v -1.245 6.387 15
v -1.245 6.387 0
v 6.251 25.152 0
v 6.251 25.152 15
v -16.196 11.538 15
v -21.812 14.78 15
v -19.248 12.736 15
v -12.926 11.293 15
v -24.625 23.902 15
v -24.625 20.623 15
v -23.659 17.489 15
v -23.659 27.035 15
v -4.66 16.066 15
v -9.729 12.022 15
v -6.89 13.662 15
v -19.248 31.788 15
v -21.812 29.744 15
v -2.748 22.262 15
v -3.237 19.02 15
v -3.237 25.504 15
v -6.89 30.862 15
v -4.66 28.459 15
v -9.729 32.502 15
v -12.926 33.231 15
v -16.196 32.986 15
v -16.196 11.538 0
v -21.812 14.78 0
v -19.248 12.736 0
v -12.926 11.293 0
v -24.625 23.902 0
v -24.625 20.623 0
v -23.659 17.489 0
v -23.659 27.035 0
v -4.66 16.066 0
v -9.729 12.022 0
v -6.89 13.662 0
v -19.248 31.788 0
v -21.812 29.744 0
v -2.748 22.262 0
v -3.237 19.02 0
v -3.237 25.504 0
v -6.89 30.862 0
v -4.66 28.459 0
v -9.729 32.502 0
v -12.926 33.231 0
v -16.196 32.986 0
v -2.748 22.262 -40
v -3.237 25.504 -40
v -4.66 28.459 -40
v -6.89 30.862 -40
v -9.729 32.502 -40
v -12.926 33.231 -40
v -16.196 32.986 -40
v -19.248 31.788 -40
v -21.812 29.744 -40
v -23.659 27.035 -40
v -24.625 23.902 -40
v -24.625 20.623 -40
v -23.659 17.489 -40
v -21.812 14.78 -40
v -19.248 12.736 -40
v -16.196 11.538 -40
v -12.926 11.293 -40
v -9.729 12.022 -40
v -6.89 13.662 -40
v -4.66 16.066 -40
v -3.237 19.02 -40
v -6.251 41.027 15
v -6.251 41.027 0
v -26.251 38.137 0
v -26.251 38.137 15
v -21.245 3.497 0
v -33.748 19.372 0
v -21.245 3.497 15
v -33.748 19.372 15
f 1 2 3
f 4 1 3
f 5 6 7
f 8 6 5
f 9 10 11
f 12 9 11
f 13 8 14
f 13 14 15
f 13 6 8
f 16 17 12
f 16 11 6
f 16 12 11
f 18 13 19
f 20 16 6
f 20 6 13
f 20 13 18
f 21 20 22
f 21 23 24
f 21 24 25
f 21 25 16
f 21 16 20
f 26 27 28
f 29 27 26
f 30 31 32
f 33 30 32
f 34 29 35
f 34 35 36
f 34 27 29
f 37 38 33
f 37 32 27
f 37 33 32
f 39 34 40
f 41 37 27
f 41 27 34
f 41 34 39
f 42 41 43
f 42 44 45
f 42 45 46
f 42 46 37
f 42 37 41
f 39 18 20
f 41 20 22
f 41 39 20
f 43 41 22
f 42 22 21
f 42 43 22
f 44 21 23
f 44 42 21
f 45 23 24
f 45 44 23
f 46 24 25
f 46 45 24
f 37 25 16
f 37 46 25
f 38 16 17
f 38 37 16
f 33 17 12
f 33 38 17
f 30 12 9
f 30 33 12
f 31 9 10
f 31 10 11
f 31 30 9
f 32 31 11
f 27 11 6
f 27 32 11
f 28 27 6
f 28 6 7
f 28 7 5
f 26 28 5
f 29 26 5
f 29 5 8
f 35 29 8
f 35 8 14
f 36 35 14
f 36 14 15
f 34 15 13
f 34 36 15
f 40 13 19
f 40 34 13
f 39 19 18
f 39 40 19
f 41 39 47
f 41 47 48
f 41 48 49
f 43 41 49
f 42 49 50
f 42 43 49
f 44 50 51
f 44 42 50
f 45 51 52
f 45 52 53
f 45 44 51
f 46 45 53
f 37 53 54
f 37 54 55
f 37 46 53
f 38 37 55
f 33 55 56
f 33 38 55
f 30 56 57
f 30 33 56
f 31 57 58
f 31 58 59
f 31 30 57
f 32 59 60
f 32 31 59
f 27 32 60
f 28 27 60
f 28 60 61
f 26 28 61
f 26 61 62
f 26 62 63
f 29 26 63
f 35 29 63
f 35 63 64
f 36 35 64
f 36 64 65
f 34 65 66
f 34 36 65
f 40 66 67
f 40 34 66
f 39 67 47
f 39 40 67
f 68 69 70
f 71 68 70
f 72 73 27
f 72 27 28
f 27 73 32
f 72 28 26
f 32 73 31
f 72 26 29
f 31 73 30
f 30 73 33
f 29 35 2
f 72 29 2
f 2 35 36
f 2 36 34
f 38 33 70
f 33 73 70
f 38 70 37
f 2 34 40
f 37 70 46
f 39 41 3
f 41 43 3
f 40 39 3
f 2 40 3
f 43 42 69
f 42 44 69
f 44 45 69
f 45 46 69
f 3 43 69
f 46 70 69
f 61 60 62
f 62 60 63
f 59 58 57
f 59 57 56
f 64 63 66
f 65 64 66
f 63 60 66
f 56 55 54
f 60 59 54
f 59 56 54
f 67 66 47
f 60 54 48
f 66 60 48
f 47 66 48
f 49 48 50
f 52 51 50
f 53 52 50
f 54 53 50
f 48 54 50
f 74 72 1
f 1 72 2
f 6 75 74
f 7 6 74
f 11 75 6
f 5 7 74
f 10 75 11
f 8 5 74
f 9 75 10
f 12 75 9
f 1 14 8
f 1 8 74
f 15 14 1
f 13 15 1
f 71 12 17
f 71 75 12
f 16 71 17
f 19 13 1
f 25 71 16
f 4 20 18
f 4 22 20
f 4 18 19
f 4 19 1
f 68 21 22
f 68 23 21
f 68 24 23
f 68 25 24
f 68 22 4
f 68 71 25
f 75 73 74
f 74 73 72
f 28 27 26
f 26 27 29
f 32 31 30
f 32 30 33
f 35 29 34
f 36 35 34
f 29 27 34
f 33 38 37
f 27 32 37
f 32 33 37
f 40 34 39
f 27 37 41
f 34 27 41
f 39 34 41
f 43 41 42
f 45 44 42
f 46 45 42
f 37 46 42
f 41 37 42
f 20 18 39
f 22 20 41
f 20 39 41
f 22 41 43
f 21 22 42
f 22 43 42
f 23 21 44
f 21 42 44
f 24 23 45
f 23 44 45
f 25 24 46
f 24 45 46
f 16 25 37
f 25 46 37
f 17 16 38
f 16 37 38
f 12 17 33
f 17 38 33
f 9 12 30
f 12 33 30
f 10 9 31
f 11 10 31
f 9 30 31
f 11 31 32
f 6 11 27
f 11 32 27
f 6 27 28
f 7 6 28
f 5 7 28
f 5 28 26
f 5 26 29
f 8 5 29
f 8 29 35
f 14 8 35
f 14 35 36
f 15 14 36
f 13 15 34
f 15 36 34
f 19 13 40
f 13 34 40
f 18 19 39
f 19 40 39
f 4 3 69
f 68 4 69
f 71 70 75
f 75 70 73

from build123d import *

# Parameters (mm, degrees)
F0_R     = 11
F1_DEPTH = 40
F2_DEPTH = 15
F3_DEPTH = 15


with BuildPart() as f1:
    # F0 (on Top) → F1 (new body)
    with BuildSketch(Plane.XY):
        with Locations((-13.7481692702, 22.2620804769)):
            Circle(F0_R)
    extrude(amount=-F1_DEPTH)


with BuildPart() as f2:
    # F0 (on Top) → F2 (new body)
    with BuildSketch(Plane.XY):
        Polygon((6.2513423017, 25.1522137299), (-6.2513423017, 41.0272321879), (-26.2508538735, 38.137098935), (-33.7476808421, 19.371947224), (-21.2449962388, 3.4969287659), (-1.2454846669, 6.3870620189), align=None)
        with Locations((-13.7481692702, 22.2620804769)):
            Circle(F0_R, mode=Mode.SUBTRACT)
    extrude(amount=F2_DEPTH)


with BuildPart() as f3:
    # F3 (new): a face of the model
    f3_faces = [f1.part.faces().sort_by_distance(p)[0] for p in [
        (-13.7481692702, 22.2620804769, 0),
    ]]
    extrude(f3_faces, amount=F3_DEPTH)


solid = Compound([f1.part, f2.part, f3.part])
